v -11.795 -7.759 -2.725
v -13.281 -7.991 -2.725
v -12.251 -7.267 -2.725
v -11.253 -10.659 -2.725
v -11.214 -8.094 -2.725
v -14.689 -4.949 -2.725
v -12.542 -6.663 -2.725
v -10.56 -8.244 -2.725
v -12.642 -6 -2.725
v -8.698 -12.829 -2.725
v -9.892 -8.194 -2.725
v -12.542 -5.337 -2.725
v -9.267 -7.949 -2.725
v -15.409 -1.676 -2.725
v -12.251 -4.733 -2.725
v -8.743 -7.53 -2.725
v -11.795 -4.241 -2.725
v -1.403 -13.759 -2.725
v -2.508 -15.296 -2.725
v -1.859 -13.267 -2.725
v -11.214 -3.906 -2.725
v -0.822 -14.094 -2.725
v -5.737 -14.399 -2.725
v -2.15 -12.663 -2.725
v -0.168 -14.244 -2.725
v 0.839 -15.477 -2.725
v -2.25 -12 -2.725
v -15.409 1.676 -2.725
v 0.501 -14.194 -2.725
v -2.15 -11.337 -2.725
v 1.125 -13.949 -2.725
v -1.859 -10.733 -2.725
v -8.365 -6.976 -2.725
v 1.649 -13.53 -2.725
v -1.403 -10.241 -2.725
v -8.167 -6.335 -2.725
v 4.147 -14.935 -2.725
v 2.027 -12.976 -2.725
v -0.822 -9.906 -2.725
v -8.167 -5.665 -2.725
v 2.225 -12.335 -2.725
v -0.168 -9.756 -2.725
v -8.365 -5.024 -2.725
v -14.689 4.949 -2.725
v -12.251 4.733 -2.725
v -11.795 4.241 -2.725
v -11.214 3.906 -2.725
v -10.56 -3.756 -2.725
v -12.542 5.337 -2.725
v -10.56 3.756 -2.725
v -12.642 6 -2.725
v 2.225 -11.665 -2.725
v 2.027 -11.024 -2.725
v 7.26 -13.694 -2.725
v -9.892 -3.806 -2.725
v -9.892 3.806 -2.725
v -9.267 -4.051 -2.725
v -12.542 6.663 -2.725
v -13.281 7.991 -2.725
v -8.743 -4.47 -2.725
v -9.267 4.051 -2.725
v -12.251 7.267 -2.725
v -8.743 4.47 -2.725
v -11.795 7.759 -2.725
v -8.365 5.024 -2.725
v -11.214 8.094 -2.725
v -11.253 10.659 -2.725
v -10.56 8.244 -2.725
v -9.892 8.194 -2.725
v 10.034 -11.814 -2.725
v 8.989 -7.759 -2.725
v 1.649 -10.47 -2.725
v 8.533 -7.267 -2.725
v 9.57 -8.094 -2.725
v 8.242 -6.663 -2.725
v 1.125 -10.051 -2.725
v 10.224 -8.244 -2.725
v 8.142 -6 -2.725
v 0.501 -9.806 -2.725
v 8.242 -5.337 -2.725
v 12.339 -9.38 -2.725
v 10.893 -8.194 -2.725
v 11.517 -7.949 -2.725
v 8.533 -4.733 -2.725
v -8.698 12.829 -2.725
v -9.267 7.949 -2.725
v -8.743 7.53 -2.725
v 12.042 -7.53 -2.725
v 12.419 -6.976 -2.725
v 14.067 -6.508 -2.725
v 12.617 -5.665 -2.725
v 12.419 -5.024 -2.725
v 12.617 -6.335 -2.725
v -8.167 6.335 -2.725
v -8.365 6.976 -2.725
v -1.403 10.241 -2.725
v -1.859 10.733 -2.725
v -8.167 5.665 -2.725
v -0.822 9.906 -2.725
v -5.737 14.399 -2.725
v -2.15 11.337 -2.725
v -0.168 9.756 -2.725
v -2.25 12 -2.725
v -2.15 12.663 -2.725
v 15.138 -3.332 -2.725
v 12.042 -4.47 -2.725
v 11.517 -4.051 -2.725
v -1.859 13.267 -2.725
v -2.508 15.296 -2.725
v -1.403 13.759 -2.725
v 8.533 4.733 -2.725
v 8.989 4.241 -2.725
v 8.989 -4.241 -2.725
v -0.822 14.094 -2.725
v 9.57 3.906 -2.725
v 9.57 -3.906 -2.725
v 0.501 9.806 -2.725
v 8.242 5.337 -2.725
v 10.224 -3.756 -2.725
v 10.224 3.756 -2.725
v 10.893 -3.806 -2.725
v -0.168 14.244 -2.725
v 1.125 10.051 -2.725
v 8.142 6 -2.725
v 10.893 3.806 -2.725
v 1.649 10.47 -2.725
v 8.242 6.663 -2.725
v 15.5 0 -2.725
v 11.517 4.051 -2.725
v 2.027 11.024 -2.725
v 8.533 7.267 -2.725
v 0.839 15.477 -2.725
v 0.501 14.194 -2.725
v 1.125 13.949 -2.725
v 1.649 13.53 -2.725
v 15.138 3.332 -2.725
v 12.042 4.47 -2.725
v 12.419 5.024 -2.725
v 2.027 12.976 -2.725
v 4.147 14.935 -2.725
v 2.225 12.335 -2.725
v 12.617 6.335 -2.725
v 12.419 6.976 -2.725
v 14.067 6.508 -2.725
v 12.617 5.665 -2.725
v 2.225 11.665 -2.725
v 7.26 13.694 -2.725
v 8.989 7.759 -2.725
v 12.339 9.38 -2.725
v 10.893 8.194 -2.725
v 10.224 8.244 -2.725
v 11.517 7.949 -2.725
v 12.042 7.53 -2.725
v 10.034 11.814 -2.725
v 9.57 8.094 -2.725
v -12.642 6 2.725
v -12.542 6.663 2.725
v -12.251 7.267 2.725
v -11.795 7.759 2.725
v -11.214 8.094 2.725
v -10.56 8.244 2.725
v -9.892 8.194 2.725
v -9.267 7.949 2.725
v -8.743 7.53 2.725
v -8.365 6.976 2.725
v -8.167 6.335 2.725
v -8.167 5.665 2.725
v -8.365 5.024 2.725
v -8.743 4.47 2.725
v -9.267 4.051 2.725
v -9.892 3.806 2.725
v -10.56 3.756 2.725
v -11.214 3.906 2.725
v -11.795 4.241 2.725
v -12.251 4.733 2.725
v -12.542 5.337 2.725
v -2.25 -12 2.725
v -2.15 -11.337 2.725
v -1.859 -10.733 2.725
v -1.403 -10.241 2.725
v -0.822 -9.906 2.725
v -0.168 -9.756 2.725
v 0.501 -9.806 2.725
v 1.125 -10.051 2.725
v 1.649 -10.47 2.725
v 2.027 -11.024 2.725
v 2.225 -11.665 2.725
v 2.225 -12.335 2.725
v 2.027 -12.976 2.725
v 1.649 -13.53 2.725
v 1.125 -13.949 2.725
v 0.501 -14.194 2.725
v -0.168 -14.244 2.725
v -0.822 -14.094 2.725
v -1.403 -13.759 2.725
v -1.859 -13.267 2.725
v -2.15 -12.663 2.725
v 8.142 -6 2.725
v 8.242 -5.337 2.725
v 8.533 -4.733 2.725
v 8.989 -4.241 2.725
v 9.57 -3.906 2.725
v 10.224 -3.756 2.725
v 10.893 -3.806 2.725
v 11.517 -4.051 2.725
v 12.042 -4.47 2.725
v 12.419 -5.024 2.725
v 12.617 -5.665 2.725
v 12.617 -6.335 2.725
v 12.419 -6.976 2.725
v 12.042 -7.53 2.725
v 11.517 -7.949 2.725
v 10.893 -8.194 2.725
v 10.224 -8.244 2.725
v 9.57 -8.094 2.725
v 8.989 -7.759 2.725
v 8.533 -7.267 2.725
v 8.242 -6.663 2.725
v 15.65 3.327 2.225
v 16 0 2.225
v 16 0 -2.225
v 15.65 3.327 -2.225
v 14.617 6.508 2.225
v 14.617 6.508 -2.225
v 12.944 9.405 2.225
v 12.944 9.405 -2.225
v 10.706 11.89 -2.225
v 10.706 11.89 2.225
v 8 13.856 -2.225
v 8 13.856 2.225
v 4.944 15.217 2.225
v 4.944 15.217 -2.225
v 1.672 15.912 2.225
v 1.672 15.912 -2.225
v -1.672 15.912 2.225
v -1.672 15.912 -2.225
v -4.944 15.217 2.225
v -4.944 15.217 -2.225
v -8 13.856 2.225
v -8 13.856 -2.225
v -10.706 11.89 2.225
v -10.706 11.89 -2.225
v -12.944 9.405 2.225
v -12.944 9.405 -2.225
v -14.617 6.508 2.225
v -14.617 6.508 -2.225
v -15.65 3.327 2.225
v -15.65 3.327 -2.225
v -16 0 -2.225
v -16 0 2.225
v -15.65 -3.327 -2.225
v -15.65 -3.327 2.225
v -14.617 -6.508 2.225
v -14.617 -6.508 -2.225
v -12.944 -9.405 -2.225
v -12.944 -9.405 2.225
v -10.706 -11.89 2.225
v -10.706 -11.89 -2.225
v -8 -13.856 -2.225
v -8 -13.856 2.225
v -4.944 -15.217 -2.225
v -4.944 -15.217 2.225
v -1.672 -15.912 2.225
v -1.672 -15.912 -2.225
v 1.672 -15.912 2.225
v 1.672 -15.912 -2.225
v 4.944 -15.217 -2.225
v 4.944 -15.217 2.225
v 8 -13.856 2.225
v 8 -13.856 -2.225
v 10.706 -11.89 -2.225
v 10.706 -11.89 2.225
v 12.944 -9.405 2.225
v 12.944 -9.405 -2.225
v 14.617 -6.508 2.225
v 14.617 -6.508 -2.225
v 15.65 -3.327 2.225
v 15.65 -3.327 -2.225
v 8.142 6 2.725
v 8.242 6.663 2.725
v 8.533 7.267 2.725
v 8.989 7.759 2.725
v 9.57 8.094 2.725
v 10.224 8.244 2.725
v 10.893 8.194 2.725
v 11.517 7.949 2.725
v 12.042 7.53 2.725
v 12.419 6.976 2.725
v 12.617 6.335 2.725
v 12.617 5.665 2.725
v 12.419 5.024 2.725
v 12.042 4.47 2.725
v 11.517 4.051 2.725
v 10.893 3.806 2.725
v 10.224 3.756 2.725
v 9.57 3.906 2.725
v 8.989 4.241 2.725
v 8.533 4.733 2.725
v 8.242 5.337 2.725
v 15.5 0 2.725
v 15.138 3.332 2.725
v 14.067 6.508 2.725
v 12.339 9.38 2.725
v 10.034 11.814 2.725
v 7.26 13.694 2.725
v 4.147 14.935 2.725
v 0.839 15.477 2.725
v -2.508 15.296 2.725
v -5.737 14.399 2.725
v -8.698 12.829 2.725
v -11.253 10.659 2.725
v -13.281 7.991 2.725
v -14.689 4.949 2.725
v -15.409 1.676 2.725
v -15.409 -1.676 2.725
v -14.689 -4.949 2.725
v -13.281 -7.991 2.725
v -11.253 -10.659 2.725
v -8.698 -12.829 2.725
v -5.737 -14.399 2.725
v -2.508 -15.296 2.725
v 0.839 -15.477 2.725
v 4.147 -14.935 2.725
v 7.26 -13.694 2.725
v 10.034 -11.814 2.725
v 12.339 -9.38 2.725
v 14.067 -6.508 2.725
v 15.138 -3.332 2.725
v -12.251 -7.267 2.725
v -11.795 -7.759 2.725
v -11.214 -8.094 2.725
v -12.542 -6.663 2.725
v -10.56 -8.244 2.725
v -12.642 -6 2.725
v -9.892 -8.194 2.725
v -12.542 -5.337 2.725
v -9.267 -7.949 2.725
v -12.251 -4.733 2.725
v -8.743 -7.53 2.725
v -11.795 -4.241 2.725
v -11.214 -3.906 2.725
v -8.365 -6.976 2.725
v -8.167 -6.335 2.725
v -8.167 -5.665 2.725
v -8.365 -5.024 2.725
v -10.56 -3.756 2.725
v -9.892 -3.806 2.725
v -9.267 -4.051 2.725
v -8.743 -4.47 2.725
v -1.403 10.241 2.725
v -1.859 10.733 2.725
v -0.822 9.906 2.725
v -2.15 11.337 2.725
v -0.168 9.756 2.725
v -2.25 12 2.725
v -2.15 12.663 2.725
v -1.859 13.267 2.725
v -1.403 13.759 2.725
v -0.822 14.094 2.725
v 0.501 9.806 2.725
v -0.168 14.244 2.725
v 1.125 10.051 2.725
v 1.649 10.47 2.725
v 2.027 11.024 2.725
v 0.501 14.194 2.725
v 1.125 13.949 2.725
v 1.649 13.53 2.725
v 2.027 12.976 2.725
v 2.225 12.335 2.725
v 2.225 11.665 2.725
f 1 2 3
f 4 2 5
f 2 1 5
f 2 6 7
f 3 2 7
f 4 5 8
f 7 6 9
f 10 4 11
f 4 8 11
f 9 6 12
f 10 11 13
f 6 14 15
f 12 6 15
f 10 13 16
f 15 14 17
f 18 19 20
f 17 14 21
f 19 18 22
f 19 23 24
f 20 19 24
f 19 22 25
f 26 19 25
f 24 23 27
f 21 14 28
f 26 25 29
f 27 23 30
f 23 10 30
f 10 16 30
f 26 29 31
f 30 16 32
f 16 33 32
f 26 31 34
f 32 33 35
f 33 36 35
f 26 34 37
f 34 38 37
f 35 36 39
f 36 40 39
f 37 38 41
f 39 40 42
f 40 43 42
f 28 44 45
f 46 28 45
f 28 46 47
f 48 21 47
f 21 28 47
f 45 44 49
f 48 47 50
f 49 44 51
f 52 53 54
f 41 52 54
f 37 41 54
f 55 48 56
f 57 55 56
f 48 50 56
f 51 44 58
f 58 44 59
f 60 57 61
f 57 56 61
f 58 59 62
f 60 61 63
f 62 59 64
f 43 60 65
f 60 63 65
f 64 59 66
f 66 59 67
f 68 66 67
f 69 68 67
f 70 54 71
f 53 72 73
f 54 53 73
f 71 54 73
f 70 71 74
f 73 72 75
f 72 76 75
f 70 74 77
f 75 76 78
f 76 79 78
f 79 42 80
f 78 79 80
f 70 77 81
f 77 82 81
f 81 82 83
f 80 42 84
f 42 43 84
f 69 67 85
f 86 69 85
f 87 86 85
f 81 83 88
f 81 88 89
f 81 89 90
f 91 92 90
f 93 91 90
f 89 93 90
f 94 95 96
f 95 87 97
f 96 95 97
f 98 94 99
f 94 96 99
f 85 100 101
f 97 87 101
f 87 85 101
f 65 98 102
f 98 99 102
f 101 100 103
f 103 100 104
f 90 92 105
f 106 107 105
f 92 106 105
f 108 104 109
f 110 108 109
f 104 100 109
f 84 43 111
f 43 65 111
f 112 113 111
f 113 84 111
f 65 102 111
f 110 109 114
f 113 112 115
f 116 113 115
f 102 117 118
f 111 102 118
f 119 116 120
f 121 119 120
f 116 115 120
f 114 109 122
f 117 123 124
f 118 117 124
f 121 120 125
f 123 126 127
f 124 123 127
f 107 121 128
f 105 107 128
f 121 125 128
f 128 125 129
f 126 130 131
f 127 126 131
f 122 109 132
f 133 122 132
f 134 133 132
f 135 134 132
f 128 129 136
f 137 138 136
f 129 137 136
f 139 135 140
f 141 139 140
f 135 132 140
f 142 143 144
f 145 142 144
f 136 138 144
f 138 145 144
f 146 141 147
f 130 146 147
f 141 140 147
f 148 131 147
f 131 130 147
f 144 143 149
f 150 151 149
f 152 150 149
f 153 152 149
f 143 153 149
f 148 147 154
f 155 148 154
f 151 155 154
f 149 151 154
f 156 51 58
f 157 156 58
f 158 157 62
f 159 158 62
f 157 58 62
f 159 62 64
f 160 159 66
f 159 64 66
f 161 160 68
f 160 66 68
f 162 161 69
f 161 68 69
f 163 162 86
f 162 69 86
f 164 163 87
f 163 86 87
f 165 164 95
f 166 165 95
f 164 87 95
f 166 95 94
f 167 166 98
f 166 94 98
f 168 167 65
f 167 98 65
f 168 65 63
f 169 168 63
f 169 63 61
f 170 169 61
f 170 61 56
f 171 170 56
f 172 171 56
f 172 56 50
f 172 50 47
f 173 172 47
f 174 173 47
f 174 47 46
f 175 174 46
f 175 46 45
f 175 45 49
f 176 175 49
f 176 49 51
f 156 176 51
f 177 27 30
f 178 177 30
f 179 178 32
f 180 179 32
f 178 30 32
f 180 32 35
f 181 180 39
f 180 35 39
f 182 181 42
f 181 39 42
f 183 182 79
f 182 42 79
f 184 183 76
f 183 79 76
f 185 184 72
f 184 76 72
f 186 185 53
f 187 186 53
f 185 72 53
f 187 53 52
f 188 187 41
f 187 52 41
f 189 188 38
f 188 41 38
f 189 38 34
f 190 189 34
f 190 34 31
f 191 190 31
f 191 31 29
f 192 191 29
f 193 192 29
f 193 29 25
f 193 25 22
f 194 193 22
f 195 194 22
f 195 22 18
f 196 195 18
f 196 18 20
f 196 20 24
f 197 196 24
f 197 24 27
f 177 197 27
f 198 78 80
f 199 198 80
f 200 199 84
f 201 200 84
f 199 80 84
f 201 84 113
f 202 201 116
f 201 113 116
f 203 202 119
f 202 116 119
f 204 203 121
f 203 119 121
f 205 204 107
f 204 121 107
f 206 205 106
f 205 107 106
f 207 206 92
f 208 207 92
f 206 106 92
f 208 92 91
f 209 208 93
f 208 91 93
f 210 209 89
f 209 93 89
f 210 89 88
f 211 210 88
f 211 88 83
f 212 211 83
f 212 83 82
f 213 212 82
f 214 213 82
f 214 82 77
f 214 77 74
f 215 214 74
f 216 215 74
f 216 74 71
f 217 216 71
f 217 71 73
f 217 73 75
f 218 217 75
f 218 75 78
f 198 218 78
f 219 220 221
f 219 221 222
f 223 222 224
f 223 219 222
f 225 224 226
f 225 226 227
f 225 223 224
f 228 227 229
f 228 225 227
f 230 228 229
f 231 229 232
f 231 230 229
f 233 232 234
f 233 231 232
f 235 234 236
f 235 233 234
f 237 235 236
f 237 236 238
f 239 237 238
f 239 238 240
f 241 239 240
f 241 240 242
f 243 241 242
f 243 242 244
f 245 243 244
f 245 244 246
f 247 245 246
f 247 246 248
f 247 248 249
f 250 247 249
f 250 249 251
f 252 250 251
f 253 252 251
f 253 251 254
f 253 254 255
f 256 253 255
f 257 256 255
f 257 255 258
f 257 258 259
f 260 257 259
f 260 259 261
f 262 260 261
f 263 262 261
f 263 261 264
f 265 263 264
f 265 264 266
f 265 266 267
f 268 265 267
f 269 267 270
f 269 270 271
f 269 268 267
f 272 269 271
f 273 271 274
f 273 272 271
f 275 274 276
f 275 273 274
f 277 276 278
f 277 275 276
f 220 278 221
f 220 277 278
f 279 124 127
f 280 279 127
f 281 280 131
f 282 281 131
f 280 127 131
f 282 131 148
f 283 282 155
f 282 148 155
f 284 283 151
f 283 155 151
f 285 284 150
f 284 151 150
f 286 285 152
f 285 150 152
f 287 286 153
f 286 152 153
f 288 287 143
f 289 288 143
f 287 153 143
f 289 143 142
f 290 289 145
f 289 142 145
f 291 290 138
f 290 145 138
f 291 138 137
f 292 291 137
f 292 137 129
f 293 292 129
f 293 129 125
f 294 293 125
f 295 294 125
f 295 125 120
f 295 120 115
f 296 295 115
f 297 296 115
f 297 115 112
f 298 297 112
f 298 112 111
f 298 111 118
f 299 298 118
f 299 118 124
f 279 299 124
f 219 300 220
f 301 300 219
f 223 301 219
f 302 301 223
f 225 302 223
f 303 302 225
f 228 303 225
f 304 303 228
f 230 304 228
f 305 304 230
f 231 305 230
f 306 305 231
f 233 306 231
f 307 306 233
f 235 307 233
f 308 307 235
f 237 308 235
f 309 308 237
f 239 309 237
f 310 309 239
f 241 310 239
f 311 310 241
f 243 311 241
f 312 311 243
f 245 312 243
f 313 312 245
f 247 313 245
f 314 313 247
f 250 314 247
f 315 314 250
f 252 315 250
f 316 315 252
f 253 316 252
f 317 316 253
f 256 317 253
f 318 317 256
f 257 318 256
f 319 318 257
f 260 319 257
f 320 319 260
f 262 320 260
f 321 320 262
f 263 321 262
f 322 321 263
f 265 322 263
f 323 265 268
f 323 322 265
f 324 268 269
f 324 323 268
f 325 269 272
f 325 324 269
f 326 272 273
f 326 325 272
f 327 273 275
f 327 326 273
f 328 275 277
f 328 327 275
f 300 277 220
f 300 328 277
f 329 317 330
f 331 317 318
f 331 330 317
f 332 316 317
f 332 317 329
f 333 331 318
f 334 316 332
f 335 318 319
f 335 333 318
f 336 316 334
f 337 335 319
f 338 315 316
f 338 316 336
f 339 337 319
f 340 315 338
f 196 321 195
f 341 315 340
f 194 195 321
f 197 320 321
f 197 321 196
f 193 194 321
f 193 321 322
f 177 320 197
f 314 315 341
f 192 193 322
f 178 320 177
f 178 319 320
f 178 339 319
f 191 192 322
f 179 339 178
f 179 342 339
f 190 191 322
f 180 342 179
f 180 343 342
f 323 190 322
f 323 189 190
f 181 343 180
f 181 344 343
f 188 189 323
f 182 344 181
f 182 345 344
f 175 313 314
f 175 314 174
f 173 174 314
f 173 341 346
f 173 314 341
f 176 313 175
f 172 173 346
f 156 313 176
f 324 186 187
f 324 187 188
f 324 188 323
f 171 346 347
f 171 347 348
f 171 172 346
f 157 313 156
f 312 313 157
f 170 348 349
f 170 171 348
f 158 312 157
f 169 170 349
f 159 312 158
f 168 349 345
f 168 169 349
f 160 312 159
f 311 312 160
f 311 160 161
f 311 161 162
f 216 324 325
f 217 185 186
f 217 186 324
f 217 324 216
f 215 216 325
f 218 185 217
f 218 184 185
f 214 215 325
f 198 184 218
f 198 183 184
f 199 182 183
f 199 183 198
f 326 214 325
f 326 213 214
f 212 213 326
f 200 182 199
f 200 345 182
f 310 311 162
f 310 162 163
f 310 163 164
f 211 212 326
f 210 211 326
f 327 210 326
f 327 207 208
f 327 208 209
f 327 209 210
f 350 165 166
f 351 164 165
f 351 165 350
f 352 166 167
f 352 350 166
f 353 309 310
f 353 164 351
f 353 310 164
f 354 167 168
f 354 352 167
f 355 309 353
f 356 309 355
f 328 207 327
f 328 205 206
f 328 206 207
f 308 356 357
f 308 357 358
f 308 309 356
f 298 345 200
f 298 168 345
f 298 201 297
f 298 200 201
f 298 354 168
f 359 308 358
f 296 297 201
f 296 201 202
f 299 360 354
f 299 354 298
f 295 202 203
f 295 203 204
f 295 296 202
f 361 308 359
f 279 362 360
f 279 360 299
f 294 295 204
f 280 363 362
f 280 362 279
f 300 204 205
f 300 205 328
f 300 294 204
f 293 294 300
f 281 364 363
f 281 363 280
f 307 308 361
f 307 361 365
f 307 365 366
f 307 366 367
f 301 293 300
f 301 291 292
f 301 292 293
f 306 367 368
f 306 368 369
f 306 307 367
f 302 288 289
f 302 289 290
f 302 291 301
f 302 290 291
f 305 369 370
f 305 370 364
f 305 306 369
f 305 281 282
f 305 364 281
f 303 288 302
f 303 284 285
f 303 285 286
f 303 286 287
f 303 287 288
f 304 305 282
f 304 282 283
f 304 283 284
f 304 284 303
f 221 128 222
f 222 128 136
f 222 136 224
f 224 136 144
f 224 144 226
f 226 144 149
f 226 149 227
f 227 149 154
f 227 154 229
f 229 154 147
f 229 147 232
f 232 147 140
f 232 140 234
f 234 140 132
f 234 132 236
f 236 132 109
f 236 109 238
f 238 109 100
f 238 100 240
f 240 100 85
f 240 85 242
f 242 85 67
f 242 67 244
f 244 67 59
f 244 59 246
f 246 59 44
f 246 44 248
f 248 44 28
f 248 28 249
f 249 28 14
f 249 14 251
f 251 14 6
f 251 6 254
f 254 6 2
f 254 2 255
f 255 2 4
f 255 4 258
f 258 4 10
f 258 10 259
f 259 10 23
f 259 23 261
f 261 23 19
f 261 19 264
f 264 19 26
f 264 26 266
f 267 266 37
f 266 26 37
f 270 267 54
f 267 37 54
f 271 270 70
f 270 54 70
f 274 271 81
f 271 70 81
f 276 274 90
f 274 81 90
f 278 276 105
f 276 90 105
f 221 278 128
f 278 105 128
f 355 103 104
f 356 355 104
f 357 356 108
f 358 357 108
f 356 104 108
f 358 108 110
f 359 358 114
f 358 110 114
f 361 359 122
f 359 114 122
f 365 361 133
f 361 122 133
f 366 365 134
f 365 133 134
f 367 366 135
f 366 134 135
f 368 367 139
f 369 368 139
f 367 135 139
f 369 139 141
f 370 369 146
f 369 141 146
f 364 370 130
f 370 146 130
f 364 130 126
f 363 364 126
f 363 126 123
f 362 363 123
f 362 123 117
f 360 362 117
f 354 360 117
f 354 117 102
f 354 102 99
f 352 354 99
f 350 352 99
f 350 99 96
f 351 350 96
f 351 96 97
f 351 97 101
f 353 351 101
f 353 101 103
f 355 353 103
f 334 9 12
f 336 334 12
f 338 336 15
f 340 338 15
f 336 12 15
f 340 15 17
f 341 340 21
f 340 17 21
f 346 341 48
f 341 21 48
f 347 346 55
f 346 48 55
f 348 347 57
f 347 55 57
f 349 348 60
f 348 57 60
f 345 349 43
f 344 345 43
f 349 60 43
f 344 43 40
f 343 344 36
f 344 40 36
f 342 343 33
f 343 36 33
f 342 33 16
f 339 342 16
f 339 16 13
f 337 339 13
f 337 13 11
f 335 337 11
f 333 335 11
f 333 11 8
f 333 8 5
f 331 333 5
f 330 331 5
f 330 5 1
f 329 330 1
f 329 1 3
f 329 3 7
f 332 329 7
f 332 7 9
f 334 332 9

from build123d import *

# Parameters (mm, degrees)
SKIZZE1_R                       = 16
AUFSATZ_LINEAR_AUSTRAGEN1_DEPTH = 2.725
DURCHGANGSLOCH_F_R_M41_D        = 4.5
FASE1_SIZE                      = 0.5


with BuildPart() as part:
    # Skizze1 → Aufsatz-Linear austragen1 (new, symmetric)
    with BuildSketch(Plane.XY):
        Circle(SKIZZE1_R)
    extrude(amount=AUFSATZ_LINEAR_AUSTRAGEN1_DEPTH, both=True)

    # Durchgangsloch für M41 (through all)
    with Locations(Plane.XY.offset(2.725)):
        with Locations((-10.392304845, 6), (0, 12), (10.392304845, 6), (10.392304845, -6), (0, -12), (-10.392304845, -6)):
            Hole(DURCHGANGSLOCH_F_R_M41_D / 2)

    # Fase1
    fase1_edges = [part.edges().sort_by_distance(p)[0] for p in [
        (-16, 0, -2.725),
        (-16, 0, 2.725),
    ]]
    chamfer(fase1_edges, length=FASE1_SIZE)


solid = part.part
